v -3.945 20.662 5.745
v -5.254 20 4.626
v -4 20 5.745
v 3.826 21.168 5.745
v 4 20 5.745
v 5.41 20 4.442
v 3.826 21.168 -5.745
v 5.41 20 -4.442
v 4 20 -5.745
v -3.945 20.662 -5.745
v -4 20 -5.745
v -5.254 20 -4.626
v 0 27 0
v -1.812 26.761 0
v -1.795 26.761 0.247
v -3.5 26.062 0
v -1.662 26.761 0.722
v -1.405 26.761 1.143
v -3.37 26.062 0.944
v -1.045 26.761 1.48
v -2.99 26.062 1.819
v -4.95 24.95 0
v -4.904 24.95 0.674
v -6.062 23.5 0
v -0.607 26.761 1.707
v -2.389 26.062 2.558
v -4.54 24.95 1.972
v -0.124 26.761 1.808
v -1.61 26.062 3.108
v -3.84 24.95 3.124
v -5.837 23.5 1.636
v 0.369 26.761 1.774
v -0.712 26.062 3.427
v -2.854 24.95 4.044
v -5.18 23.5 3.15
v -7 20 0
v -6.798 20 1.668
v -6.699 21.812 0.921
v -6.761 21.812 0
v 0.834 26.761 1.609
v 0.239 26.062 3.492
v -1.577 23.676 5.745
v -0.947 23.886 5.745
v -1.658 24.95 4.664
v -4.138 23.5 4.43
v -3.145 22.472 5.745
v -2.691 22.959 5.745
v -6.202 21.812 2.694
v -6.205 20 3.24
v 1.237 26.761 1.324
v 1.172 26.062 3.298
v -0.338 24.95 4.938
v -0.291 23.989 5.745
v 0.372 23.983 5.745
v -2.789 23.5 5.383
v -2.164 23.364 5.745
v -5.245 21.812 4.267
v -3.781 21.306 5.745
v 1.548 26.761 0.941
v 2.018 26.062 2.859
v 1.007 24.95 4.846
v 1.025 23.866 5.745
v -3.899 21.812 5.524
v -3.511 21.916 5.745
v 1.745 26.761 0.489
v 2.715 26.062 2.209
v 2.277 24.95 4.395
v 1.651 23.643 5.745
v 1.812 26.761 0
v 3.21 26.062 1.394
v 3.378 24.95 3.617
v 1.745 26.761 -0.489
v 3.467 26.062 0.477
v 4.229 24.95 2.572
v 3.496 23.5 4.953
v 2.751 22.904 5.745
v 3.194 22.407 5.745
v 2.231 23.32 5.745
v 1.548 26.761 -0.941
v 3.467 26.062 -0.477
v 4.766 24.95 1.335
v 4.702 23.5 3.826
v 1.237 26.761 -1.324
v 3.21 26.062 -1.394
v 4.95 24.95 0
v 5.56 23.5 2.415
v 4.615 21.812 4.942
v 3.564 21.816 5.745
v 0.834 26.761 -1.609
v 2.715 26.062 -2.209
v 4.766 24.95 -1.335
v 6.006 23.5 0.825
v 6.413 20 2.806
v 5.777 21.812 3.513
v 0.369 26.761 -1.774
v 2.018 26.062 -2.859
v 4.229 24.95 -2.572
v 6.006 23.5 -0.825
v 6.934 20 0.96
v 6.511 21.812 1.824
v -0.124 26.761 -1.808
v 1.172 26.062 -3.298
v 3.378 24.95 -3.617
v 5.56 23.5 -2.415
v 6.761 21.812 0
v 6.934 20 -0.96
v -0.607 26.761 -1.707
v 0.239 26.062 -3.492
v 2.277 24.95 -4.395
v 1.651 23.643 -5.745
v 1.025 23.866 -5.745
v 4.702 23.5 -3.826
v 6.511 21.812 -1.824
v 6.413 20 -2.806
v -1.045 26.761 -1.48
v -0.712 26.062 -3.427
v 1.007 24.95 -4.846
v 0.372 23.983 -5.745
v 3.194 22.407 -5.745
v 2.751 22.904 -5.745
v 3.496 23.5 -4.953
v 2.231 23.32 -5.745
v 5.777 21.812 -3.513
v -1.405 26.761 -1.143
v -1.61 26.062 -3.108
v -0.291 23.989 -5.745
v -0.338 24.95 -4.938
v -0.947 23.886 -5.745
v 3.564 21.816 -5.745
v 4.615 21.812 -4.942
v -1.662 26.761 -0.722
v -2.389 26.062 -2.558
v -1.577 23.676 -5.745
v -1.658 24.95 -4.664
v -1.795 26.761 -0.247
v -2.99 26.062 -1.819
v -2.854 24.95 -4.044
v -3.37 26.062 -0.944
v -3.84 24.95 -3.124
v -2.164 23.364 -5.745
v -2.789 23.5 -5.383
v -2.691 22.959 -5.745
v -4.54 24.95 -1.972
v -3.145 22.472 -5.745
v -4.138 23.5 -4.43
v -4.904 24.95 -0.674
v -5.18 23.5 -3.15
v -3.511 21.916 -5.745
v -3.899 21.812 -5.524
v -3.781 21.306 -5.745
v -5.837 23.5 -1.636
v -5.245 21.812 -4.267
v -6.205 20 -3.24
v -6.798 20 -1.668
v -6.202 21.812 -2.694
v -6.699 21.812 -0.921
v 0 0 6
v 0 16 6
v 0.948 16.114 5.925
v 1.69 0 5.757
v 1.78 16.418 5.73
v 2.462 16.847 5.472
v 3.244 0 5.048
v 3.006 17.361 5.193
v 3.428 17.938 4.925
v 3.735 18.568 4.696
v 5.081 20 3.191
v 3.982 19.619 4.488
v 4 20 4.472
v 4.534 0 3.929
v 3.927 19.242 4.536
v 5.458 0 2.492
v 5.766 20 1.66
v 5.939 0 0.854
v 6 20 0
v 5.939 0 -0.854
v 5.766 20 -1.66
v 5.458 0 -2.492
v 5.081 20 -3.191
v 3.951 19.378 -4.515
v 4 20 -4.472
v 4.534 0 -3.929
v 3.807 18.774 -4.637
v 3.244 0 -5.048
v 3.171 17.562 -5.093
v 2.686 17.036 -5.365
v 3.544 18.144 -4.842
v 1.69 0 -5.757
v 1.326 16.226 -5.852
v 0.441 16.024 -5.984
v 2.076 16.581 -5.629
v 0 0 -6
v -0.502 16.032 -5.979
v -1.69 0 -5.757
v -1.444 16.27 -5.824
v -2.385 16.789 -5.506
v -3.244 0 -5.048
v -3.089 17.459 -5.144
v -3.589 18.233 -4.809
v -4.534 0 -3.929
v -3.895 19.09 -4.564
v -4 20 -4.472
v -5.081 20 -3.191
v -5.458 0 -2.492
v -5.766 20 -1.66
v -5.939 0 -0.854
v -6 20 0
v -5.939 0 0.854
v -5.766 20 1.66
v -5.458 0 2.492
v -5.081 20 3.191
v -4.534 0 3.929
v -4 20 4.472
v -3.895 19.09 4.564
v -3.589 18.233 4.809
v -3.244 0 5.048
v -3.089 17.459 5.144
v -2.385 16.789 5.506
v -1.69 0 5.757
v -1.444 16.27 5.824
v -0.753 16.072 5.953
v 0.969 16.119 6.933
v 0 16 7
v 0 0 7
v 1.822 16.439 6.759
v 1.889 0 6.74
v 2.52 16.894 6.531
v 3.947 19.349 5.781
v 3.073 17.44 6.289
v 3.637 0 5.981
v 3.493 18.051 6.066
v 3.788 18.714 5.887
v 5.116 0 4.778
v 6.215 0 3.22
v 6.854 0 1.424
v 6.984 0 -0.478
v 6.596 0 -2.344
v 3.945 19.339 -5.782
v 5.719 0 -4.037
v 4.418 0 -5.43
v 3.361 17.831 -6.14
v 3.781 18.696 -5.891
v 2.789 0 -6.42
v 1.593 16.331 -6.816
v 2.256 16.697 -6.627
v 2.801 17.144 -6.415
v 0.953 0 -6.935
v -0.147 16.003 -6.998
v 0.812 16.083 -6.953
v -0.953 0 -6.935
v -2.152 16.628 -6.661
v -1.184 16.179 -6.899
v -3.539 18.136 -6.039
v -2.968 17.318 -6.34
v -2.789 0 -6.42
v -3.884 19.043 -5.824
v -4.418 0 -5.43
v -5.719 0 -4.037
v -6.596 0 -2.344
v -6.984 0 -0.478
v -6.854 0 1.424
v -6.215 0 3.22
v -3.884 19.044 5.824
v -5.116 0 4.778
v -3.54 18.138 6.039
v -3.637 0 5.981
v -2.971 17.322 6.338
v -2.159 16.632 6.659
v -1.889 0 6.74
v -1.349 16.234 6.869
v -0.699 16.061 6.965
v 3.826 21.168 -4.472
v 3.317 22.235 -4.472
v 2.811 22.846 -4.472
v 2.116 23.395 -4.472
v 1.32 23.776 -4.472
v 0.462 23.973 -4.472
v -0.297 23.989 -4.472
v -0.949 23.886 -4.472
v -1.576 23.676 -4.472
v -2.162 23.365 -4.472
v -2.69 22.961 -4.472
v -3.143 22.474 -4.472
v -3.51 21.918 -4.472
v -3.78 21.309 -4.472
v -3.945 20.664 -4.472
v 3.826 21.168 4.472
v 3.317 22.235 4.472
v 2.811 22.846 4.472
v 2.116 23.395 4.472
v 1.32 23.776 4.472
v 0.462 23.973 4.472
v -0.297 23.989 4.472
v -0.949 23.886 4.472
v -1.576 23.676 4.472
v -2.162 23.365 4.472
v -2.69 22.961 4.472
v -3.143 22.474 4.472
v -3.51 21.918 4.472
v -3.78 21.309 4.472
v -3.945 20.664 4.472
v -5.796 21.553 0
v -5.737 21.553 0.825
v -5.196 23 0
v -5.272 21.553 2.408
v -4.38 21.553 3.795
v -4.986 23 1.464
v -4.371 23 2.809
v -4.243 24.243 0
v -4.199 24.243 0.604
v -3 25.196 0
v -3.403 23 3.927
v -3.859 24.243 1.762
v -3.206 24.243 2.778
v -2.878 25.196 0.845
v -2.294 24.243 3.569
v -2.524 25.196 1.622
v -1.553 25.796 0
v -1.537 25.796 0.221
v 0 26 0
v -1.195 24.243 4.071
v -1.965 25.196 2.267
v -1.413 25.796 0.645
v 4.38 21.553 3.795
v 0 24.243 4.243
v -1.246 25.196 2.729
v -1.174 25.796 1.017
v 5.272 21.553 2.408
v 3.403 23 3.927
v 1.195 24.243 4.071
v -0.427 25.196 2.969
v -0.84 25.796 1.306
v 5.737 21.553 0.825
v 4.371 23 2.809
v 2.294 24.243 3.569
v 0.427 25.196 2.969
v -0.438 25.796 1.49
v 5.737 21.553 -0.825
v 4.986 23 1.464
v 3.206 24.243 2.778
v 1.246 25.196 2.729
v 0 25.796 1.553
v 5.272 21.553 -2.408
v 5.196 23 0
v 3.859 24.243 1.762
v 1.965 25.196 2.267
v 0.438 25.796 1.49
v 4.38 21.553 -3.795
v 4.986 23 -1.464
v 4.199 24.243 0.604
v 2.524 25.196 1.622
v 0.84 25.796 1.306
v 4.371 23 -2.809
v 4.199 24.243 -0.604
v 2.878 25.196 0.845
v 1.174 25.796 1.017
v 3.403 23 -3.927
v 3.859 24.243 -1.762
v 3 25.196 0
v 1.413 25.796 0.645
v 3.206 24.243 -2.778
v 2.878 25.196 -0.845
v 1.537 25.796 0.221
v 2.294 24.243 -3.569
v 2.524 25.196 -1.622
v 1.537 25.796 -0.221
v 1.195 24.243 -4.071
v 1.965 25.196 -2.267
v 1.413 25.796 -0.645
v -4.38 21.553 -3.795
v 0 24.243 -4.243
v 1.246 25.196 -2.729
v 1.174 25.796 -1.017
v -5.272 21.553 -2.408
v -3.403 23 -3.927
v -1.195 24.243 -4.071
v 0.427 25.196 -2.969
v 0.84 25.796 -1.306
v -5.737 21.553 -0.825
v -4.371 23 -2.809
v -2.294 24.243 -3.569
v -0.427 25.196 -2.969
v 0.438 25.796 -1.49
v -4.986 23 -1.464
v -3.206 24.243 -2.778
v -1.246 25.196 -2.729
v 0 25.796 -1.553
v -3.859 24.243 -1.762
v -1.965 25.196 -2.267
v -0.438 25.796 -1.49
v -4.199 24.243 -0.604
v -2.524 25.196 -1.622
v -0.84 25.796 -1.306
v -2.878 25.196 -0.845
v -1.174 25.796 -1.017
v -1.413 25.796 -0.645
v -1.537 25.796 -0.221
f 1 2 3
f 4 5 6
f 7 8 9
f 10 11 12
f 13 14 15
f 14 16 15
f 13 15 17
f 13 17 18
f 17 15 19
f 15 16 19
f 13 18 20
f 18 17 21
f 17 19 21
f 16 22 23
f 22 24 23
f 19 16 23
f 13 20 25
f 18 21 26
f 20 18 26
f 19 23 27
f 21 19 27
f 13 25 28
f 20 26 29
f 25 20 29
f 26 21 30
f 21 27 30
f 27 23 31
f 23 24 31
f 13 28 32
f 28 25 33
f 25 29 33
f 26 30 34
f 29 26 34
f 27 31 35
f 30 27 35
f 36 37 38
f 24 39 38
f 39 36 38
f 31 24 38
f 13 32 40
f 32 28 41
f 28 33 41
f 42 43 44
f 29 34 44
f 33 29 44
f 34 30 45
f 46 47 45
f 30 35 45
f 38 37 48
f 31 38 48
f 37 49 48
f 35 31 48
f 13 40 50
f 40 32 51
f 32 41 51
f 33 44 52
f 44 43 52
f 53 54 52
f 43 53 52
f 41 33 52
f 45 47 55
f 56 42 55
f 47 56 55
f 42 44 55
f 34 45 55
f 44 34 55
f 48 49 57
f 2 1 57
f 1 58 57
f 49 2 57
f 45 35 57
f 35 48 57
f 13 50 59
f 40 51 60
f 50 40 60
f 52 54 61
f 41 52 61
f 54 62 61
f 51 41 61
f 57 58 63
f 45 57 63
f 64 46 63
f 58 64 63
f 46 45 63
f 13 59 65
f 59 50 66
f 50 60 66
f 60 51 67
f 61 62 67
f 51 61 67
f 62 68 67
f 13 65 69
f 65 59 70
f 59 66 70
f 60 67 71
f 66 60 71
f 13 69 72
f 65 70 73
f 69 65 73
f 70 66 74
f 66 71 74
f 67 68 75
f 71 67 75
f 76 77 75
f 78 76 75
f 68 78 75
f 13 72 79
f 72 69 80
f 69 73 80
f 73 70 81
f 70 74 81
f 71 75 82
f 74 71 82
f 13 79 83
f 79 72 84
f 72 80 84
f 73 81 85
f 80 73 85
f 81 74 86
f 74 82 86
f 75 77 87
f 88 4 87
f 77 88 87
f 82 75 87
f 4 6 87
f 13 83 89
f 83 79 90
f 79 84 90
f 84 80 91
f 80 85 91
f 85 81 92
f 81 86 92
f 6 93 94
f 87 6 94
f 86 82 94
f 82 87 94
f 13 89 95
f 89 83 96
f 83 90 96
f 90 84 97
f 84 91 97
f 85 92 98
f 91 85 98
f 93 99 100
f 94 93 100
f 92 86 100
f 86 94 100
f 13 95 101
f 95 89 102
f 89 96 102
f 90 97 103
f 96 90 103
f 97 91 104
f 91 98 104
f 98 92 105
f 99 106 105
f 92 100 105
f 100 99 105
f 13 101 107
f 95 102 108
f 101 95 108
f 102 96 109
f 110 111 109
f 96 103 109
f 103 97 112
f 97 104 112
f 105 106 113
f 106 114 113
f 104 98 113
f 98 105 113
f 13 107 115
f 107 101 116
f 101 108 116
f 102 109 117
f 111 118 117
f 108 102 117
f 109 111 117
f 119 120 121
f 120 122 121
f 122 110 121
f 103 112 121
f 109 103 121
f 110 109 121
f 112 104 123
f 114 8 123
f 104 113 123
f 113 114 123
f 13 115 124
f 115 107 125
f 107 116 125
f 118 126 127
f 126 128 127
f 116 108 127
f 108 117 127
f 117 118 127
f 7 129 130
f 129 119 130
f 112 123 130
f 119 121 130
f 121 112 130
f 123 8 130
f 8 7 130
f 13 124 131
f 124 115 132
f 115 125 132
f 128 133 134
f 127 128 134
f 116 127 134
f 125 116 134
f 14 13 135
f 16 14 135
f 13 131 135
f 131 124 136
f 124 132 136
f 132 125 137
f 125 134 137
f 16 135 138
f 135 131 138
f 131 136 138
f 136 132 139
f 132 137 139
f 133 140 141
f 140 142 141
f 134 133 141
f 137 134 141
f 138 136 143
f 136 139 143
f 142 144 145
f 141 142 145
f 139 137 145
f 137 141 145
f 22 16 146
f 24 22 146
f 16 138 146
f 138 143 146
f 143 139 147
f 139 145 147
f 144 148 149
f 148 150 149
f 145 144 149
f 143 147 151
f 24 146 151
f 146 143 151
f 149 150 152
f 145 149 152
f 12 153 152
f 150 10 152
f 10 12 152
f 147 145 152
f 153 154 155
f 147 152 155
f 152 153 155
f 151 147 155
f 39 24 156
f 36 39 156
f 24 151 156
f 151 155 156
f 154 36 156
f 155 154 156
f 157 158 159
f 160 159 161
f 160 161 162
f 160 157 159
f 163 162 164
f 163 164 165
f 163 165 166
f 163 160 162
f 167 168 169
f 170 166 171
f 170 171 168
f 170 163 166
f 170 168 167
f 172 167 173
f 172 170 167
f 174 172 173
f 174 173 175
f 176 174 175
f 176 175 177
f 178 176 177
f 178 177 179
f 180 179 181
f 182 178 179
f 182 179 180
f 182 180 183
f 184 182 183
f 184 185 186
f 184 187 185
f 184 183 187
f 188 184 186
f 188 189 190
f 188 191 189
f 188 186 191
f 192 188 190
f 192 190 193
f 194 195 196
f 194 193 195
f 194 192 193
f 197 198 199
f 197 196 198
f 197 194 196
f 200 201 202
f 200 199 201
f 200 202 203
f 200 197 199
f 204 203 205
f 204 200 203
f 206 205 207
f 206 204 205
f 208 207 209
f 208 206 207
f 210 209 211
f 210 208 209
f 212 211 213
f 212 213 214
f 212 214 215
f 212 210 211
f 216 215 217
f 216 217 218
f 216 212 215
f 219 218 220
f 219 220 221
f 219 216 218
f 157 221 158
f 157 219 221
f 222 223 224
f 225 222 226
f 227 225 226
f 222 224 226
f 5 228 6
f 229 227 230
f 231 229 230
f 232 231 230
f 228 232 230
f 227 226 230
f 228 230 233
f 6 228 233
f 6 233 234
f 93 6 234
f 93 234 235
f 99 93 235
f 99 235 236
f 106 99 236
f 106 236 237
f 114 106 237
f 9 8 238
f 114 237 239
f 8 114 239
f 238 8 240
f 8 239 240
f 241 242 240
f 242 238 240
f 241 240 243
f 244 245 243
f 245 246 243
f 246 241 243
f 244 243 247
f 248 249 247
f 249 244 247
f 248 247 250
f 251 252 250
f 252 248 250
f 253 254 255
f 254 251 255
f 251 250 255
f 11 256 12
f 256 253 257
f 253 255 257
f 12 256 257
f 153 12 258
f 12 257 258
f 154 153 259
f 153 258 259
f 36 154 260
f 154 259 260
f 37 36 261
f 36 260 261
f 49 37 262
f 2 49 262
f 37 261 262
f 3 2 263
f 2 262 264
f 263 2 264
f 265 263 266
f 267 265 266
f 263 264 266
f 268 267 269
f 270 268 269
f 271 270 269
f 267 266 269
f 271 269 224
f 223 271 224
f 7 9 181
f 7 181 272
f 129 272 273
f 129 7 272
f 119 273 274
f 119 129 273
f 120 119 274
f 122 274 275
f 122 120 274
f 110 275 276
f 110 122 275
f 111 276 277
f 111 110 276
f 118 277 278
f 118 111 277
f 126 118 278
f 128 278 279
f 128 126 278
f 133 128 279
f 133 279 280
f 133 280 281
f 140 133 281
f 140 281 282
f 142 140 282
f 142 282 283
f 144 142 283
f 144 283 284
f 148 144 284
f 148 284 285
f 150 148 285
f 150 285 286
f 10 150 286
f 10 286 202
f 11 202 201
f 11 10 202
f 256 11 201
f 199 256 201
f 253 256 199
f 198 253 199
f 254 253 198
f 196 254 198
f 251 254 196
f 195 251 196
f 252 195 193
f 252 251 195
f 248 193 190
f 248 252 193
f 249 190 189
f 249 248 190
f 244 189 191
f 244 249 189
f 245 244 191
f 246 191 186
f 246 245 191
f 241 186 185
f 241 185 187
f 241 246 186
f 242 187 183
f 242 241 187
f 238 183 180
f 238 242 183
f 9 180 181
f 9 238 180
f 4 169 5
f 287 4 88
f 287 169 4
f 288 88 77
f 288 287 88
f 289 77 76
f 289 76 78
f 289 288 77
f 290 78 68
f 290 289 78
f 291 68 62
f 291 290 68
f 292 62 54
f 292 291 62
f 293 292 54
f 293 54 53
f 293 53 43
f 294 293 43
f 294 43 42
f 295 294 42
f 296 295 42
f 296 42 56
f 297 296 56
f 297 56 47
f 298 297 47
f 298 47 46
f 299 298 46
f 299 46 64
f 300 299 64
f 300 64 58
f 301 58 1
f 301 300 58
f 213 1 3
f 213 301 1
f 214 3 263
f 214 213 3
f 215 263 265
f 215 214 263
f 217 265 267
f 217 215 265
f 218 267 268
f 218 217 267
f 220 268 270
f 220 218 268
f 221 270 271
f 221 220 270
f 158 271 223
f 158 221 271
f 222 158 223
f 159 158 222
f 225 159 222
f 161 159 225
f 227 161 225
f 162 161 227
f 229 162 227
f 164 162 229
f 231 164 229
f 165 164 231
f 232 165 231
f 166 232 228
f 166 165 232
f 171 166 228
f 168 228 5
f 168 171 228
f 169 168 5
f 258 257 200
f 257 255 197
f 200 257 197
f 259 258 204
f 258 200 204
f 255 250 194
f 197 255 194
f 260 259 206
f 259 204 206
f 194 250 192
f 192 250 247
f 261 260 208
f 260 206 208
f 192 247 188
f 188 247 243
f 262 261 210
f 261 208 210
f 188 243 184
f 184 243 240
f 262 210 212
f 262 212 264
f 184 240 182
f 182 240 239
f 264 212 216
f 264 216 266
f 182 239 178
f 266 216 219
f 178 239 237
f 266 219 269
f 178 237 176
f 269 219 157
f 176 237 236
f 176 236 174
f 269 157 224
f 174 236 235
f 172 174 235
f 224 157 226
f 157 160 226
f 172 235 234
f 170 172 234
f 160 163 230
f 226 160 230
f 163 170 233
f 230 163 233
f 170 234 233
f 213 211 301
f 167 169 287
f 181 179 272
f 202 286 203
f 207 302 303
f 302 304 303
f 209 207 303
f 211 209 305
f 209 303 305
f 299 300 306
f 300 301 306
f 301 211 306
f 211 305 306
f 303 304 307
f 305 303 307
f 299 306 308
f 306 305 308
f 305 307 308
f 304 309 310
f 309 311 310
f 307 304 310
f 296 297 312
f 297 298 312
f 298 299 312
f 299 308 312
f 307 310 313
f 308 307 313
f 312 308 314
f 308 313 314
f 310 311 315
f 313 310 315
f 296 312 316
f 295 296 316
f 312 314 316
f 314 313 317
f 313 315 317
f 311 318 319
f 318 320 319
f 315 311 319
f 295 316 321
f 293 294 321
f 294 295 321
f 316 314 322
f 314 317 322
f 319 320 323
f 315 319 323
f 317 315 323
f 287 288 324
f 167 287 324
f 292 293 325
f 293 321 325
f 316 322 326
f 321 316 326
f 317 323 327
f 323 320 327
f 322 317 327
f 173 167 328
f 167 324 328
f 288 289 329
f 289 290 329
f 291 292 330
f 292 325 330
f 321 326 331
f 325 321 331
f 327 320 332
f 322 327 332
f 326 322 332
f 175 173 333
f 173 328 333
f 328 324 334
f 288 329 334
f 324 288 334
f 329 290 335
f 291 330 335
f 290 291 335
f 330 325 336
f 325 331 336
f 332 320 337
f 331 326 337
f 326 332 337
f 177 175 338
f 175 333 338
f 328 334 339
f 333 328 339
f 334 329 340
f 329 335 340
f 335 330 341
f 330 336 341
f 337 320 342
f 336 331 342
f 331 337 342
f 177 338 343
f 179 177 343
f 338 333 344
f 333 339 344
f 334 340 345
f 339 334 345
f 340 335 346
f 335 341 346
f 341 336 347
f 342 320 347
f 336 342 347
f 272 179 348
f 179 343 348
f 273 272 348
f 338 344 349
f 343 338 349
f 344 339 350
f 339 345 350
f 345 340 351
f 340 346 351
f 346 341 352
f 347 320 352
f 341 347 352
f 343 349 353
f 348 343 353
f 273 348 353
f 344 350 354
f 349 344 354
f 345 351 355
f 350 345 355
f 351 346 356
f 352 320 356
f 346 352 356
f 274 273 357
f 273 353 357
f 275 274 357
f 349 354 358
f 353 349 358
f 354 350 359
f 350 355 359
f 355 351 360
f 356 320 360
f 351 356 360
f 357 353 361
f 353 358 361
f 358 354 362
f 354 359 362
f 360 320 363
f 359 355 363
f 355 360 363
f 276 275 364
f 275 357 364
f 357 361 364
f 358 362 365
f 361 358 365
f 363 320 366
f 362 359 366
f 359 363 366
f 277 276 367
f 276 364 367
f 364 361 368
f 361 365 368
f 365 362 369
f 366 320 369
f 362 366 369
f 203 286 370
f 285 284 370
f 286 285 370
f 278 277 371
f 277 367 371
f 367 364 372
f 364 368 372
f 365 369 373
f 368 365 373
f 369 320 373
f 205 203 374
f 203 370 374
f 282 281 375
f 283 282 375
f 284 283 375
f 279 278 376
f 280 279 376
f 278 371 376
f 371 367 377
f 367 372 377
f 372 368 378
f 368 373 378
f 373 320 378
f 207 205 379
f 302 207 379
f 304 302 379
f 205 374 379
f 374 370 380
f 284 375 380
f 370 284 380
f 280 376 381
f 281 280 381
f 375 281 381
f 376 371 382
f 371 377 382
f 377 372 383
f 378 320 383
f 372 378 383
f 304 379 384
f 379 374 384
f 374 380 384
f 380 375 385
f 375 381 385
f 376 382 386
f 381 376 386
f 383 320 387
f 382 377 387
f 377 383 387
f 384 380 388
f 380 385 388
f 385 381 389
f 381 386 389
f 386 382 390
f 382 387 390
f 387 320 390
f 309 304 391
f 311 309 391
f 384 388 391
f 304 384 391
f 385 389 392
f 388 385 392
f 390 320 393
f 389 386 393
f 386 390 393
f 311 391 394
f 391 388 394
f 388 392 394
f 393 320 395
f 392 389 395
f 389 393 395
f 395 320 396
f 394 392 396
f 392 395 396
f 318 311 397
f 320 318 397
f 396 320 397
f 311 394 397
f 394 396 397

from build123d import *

# Parameters (mm, degrees)
SKETCH_1_R               = 7
SKETCH_1_R_2             = 6
EXTRUDE_1_DEPTH          = 20
CUT_EXTRUDE_1_DEPTH      = 29.757607689
CUT_EXTRUDE_1_DEPTH_BACK = 29.757607689
SKETCH_3_R               = 4


with BuildPart() as part:
    # 草图1 → 凸台-拉伸1 (new body)
    with BuildSketch(Plane(origin=(0, 0, 0), x_dir=(1, 0, 0), z_dir=(0, 1, 0))):
        with Locations(Location((0, 0, 0), (0, 0, 270))):
            Circle(SKETCH_1_R)
        with Locations(Location((0, 0, 0), (0, 0, 270))):
            Circle(SKETCH_1_R_2, mode=Mode.SUBTRACT)
    extrude(amount=EXTRUDE_1_DEPTH)

    # 草图2 → 旋转1 (revolve)
    with BuildSketch(Plane.XY):
        with BuildLine():
            Line((-7, 20), (-6, 20))
            ThreePointArc((-6, 20), (-4.242640687, 24.242640687), (0, 26))
            Line((0, 26), (0, 27))
            ThreePointArc((0, 27), (-4.949747468, 24.949747468), (-7, 20))
        make_face()
    revolve(axis=Axis((0, 20, 0), (0, 1, 0)))

    # 草图3 → 切除-拉伸1 (cut, two sides: drawn at the far end of the back side and taken through both)
    with BuildSketch(Plane.XY.offset(-CUT_EXTRUDE_1_DEPTH_BACK)):
        with Locations((0, 20)):
            Circle(SKETCH_3_R)
    extrude(amount=CUT_EXTRUDE_1_DEPTH + CUT_EXTRUDE_1_DEPTH_BACK, mode=Mode.SUBTRACT)


solid = part.part
